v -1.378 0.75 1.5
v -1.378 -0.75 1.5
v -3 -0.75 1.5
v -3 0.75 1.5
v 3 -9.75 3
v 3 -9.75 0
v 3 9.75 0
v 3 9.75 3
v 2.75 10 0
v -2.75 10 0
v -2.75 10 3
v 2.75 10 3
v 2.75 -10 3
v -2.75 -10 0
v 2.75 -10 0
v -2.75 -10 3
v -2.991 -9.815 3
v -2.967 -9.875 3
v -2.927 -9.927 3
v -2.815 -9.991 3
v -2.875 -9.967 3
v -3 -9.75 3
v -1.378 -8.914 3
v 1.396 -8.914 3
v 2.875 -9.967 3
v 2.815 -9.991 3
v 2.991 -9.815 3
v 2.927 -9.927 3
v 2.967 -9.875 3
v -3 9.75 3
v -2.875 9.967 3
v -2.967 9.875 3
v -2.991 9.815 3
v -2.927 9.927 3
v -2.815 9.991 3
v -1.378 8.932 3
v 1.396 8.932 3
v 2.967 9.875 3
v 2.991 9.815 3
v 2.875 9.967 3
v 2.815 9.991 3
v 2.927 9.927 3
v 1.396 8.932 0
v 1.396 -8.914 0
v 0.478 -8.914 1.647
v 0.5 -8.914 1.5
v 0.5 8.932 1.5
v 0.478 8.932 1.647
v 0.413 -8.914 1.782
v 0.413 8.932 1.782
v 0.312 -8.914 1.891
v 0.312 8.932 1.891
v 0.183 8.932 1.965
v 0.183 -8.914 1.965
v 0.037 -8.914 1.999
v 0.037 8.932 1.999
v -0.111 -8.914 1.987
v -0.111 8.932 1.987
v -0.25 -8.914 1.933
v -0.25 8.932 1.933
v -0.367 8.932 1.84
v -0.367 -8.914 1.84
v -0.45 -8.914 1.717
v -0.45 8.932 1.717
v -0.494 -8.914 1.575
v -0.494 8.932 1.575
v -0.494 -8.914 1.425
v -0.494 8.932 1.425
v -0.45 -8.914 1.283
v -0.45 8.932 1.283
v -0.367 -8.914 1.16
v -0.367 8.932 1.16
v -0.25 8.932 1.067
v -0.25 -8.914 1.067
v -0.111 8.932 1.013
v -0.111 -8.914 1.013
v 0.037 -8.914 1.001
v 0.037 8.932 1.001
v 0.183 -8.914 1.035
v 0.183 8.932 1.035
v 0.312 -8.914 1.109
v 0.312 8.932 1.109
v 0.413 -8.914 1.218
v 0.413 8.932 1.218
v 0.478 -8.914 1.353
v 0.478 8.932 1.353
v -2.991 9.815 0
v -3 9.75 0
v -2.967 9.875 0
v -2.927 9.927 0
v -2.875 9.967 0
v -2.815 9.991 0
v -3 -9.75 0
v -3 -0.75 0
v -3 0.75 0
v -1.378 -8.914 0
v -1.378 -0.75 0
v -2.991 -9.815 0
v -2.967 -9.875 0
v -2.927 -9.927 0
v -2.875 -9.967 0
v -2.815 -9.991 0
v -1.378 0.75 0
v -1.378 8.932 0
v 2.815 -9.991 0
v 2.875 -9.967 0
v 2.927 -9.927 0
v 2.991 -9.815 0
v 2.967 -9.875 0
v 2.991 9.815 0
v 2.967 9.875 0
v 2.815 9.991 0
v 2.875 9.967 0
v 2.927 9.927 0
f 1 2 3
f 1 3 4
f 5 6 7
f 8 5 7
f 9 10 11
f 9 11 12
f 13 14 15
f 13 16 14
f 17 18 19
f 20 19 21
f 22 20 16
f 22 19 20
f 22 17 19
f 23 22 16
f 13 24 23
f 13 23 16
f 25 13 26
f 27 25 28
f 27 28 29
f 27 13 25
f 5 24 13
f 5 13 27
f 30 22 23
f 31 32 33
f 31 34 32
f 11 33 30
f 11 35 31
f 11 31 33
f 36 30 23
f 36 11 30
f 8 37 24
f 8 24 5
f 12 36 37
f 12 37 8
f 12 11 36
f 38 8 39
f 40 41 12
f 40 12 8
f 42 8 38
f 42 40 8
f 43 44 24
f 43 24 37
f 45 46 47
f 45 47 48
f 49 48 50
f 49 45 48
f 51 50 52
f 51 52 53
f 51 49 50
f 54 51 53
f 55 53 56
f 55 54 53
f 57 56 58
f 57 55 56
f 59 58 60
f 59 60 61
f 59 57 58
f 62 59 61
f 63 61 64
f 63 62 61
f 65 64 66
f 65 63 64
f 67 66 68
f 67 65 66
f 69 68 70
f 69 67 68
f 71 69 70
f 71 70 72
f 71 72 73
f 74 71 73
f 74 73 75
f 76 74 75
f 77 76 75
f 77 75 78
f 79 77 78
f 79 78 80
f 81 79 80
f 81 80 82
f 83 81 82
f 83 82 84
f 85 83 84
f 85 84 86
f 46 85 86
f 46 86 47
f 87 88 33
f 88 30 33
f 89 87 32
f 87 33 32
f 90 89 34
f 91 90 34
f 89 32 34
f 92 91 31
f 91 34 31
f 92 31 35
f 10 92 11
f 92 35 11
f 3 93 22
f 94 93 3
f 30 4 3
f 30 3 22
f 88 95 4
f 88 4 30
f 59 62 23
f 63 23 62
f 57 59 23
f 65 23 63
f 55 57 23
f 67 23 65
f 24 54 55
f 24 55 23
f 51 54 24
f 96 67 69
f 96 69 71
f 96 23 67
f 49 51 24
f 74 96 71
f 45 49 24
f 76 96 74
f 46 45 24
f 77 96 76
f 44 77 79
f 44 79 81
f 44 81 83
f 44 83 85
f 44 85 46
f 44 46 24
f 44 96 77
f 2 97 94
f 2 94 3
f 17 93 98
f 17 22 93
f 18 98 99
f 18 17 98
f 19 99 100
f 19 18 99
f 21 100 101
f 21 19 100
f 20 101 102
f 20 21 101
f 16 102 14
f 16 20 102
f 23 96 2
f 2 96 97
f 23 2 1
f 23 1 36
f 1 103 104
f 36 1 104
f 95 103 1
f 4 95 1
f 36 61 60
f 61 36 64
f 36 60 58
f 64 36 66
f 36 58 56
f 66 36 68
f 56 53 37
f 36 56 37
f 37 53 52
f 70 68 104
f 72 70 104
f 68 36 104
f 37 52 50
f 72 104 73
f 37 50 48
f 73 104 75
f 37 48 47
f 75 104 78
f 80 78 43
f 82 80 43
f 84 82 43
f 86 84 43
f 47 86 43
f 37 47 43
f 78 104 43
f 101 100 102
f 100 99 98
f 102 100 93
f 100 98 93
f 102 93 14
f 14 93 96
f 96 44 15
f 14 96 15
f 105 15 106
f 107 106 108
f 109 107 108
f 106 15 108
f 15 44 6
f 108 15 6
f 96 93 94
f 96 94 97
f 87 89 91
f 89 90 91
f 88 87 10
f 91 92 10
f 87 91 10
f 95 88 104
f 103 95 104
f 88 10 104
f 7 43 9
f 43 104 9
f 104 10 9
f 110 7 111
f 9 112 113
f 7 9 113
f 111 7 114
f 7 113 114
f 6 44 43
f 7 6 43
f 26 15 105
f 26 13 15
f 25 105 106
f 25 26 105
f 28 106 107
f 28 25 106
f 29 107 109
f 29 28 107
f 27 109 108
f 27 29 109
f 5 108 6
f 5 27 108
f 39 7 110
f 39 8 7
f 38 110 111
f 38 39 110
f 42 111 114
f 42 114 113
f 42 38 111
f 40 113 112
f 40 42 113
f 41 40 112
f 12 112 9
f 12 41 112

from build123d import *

# Parameters (mm, degrees)
F0_W     = 6
F0_H     = 20
F1_DEPTH = 3
F2_R     = 0.25
F3_W     = 2.773765591
F3_H     = 17.8463058546
F4_DEPTH = 5.9
F6_R     = 0.5
F7_DEPTH = 19.2
F8_W     = 1.5
F8_H     = 3
F9_DEPTH = 3.6


with BuildPart() as f1:
    # F0 (on Top) → F1 (new body)
    with BuildSketch(Plane.XY):
        Rectangle(F0_W, F0_H)
    extrude(amount=F1_DEPTH)

    # F2
    f2_edges = [f1.edges().sort_by_distance(p)[0] for p in [
        (3, 10, 1.5),
        (-3, 10, 1.5),
        (-3, -10, 1.5),
        (3, -10, 1.5),
    ]]
    fillet(f2_edges, radius=F2_R)

    # F3 (on Top) → F4 (cut)
    with BuildSketch(Plane.XY):
        with Locations((0.008794188, 0.008943025)):
            Rectangle(F3_W, F3_H)
    extrude(amount=F4_DEPTH, mode=Mode.SUBTRACT)

    # F6 (on offset) → F7 (join)
    with BuildSketch(Plane.XZ.offset(10)):
        with Locations((0, 1.5)):
            Circle(F6_R)
    extrude(amount=-F7_DEPTH)

    # F8 (on face) → F9 (cut)
    with BuildSketch(Plane.YZ.offset(-1.3780886075)):
        Rectangle(F8_W, F8_H)
    extrude(amount=-F9_DEPTH, mode=Mode.SUBTRACT)


solid = f1.part
